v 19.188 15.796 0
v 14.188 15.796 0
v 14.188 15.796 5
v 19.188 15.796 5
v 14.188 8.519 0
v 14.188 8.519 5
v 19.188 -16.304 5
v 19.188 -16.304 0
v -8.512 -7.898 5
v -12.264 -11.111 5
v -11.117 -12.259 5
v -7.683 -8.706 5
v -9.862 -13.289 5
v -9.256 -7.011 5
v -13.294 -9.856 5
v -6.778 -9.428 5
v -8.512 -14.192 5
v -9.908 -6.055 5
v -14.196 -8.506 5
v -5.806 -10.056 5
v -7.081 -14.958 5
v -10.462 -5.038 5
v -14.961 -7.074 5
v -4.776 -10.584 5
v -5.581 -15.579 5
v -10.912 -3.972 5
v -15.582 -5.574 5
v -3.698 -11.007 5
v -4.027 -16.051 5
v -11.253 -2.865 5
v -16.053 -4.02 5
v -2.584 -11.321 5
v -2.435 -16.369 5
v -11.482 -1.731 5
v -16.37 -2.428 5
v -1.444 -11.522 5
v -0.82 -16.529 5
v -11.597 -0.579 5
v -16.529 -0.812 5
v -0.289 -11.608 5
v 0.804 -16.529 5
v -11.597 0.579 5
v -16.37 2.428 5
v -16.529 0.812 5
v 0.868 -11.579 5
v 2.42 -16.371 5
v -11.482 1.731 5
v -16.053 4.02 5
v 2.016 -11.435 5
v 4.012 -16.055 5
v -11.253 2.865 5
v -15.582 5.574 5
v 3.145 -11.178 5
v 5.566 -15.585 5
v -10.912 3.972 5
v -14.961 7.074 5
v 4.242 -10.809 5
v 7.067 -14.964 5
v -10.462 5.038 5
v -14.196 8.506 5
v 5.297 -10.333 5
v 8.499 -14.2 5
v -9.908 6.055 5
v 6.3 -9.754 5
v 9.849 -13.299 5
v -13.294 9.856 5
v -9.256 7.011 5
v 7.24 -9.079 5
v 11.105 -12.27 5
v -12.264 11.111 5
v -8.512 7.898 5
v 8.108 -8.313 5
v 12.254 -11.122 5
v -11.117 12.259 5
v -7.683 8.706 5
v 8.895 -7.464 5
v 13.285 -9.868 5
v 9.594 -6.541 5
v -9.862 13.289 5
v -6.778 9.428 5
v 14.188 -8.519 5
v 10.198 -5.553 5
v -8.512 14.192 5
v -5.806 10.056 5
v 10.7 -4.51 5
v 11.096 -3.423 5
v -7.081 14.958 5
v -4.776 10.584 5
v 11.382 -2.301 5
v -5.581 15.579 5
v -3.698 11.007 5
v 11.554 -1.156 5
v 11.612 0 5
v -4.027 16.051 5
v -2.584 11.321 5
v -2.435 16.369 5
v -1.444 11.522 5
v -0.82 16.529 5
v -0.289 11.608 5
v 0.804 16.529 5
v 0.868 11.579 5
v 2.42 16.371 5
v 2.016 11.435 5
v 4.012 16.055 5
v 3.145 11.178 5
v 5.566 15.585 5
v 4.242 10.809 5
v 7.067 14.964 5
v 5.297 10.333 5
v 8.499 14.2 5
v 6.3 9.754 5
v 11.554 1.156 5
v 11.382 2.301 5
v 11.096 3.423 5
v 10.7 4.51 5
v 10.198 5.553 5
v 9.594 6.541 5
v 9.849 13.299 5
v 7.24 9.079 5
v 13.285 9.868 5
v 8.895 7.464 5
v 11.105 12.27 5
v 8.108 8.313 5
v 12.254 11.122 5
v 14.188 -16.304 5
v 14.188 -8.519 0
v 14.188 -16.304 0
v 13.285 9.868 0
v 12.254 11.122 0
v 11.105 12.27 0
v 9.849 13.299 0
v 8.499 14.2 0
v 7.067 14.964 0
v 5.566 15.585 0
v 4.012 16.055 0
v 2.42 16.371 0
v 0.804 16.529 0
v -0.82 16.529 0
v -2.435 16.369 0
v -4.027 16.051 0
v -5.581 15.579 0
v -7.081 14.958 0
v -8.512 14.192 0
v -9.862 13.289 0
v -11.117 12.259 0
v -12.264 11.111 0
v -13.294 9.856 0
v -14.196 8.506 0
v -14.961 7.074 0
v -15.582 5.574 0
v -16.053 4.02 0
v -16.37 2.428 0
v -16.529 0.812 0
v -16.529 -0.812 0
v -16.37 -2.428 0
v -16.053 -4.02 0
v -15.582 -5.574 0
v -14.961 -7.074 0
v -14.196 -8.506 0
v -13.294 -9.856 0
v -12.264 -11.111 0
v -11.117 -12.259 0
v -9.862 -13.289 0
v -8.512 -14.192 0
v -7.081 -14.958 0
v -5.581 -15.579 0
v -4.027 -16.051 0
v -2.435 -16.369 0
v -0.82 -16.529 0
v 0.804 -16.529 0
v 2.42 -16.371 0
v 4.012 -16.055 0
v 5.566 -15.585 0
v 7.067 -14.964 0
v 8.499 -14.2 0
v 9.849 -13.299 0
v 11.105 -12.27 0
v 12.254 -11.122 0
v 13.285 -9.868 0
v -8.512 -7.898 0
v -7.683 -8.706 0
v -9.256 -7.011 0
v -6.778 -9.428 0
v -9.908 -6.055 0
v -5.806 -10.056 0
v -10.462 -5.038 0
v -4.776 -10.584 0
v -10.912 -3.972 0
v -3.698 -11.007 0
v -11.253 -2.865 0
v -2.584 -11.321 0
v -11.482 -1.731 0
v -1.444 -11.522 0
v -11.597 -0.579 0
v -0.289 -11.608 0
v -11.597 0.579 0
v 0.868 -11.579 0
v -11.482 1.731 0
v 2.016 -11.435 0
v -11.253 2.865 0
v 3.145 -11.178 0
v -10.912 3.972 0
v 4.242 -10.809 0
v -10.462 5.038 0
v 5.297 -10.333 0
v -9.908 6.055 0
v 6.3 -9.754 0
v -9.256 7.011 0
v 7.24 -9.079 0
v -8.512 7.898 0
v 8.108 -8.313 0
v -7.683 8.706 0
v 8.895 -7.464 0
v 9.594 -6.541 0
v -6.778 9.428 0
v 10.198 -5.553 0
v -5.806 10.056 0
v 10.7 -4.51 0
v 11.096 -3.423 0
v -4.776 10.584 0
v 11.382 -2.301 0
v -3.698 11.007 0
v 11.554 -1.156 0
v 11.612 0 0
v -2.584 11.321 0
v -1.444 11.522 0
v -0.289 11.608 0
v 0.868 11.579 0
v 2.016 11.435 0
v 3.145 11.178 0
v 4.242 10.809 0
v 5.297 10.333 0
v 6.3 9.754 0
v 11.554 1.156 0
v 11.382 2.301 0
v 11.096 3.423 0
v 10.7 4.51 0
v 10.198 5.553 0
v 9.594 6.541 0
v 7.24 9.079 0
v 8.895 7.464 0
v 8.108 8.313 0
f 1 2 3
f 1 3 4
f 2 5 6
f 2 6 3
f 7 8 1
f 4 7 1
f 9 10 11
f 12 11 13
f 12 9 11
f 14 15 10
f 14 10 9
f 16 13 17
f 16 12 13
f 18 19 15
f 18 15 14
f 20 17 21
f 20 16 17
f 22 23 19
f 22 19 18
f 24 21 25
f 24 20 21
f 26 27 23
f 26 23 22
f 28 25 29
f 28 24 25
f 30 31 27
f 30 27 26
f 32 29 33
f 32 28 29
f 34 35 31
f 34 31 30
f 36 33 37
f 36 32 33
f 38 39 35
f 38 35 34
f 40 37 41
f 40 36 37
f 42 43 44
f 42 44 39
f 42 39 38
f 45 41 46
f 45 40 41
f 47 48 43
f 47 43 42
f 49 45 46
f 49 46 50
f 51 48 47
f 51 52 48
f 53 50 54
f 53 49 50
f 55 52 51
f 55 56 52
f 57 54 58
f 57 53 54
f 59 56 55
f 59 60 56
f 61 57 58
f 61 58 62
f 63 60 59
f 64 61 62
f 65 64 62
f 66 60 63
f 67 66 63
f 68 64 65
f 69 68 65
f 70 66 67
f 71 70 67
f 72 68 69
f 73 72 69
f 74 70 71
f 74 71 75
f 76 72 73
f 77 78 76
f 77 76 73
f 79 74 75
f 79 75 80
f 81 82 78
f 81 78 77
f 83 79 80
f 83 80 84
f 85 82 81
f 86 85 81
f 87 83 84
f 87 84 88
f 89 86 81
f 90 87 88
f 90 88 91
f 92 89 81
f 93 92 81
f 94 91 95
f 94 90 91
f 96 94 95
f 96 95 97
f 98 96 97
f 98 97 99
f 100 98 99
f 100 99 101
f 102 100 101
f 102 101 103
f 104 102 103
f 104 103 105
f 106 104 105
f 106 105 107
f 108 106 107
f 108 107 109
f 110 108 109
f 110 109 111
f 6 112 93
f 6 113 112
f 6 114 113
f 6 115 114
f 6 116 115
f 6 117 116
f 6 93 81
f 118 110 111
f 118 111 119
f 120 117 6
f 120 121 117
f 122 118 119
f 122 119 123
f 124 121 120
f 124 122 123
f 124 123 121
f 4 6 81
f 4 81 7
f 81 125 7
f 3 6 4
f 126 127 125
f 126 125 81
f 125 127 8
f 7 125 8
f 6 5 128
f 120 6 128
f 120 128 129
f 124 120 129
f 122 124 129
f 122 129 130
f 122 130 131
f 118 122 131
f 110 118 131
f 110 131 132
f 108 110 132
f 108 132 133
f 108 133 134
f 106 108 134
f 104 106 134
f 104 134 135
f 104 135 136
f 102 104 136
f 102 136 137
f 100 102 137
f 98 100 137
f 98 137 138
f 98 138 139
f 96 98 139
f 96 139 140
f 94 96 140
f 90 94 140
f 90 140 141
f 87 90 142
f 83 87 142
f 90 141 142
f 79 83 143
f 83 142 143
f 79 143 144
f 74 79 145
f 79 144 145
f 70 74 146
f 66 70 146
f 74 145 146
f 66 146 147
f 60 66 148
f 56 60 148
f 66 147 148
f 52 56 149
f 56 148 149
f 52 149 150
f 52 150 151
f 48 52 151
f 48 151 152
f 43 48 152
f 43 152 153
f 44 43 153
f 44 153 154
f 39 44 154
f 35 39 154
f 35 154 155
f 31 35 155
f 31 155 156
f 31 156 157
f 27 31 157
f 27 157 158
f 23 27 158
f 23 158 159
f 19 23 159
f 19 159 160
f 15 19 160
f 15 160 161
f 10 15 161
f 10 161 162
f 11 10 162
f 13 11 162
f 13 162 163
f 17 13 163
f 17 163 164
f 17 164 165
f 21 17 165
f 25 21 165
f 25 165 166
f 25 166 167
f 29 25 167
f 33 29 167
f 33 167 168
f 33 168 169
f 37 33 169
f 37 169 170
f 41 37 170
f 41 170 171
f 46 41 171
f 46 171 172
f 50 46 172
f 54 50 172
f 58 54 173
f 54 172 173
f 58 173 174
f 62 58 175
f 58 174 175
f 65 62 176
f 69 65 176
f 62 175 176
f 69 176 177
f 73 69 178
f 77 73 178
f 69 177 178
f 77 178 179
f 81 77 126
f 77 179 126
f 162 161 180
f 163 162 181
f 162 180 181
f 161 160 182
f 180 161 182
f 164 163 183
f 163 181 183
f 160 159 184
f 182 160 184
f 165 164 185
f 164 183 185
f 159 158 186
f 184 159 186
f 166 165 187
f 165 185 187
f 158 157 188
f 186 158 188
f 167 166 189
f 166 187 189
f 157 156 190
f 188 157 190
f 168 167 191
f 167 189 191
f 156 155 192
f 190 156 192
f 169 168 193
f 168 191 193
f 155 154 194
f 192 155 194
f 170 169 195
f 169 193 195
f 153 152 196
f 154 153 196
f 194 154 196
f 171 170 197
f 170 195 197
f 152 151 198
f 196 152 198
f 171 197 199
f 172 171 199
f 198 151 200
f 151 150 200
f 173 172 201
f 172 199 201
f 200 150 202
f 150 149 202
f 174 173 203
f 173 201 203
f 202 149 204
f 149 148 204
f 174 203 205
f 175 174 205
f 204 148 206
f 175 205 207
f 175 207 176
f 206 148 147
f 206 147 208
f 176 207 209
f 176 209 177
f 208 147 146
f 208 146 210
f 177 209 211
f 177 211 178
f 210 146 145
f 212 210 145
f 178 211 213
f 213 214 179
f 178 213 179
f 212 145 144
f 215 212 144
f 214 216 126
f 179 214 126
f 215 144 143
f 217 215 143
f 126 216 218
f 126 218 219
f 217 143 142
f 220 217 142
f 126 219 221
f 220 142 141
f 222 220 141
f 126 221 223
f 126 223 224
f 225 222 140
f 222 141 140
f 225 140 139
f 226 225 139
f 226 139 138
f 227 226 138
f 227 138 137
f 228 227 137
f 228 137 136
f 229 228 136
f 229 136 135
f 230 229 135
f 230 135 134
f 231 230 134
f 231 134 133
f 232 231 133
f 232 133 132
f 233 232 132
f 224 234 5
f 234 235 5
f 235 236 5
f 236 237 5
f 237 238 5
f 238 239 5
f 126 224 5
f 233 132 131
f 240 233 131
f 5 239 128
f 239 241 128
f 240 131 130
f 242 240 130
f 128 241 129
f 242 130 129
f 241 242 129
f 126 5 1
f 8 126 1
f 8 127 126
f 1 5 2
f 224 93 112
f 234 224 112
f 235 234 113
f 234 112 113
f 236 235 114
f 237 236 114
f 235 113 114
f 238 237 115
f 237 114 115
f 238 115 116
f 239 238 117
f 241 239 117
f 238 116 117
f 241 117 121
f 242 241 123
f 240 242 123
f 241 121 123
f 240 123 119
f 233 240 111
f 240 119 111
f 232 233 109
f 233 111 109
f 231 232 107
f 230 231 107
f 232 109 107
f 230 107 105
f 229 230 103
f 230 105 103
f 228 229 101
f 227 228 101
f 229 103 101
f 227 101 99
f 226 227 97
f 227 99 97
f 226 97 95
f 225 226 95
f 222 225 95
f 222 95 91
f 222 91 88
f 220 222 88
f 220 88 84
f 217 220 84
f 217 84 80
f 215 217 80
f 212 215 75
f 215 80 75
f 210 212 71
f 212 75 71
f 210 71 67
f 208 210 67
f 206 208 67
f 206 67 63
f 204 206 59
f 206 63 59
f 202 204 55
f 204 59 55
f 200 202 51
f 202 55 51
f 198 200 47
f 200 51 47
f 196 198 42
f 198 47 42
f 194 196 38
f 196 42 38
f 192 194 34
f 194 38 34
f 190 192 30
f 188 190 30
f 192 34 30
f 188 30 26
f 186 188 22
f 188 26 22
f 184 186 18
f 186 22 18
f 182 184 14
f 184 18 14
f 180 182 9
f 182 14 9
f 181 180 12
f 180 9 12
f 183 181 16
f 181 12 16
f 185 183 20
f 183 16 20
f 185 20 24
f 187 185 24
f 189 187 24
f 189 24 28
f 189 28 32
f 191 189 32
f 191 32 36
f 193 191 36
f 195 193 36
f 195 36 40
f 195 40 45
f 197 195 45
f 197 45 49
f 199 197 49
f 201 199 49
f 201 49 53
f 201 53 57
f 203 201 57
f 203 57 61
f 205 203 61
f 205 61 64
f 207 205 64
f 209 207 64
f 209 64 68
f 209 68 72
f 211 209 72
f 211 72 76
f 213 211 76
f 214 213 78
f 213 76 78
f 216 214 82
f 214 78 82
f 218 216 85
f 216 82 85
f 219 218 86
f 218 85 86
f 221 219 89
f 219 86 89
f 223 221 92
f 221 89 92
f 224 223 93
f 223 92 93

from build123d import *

# Parameters (mm, degrees)
F0_R     = 16.548871
F1_DEPTH = 5
F2_R     = 11.611904
F3_DEPTH = 5
F4_W     = 5.000622
F4_H     = 32.099514
F5_DEPTH = 5


with BuildPart() as f1:
    # F0 (on Top) → F1 (new body)
    with BuildSketch(Plane.XY):
        Circle(F0_R)
    extrude(amount=F1_DEPTH)

    # F2 (on face) → F3 (cut)
    with BuildSketch(Plane.XY.offset(5)):
        Circle(F2_R)
    extrude(amount=-F3_DEPTH, mode=Mode.SUBTRACT)

    # F4 (on Top) → F5 (join)
    with BuildSketch(Plane.XY):
        with Locations((16.688134, -0.253783)):
            Rectangle(F4_W, F4_H)
    extrude(amount=F5_DEPTH)


solid = f1.part
